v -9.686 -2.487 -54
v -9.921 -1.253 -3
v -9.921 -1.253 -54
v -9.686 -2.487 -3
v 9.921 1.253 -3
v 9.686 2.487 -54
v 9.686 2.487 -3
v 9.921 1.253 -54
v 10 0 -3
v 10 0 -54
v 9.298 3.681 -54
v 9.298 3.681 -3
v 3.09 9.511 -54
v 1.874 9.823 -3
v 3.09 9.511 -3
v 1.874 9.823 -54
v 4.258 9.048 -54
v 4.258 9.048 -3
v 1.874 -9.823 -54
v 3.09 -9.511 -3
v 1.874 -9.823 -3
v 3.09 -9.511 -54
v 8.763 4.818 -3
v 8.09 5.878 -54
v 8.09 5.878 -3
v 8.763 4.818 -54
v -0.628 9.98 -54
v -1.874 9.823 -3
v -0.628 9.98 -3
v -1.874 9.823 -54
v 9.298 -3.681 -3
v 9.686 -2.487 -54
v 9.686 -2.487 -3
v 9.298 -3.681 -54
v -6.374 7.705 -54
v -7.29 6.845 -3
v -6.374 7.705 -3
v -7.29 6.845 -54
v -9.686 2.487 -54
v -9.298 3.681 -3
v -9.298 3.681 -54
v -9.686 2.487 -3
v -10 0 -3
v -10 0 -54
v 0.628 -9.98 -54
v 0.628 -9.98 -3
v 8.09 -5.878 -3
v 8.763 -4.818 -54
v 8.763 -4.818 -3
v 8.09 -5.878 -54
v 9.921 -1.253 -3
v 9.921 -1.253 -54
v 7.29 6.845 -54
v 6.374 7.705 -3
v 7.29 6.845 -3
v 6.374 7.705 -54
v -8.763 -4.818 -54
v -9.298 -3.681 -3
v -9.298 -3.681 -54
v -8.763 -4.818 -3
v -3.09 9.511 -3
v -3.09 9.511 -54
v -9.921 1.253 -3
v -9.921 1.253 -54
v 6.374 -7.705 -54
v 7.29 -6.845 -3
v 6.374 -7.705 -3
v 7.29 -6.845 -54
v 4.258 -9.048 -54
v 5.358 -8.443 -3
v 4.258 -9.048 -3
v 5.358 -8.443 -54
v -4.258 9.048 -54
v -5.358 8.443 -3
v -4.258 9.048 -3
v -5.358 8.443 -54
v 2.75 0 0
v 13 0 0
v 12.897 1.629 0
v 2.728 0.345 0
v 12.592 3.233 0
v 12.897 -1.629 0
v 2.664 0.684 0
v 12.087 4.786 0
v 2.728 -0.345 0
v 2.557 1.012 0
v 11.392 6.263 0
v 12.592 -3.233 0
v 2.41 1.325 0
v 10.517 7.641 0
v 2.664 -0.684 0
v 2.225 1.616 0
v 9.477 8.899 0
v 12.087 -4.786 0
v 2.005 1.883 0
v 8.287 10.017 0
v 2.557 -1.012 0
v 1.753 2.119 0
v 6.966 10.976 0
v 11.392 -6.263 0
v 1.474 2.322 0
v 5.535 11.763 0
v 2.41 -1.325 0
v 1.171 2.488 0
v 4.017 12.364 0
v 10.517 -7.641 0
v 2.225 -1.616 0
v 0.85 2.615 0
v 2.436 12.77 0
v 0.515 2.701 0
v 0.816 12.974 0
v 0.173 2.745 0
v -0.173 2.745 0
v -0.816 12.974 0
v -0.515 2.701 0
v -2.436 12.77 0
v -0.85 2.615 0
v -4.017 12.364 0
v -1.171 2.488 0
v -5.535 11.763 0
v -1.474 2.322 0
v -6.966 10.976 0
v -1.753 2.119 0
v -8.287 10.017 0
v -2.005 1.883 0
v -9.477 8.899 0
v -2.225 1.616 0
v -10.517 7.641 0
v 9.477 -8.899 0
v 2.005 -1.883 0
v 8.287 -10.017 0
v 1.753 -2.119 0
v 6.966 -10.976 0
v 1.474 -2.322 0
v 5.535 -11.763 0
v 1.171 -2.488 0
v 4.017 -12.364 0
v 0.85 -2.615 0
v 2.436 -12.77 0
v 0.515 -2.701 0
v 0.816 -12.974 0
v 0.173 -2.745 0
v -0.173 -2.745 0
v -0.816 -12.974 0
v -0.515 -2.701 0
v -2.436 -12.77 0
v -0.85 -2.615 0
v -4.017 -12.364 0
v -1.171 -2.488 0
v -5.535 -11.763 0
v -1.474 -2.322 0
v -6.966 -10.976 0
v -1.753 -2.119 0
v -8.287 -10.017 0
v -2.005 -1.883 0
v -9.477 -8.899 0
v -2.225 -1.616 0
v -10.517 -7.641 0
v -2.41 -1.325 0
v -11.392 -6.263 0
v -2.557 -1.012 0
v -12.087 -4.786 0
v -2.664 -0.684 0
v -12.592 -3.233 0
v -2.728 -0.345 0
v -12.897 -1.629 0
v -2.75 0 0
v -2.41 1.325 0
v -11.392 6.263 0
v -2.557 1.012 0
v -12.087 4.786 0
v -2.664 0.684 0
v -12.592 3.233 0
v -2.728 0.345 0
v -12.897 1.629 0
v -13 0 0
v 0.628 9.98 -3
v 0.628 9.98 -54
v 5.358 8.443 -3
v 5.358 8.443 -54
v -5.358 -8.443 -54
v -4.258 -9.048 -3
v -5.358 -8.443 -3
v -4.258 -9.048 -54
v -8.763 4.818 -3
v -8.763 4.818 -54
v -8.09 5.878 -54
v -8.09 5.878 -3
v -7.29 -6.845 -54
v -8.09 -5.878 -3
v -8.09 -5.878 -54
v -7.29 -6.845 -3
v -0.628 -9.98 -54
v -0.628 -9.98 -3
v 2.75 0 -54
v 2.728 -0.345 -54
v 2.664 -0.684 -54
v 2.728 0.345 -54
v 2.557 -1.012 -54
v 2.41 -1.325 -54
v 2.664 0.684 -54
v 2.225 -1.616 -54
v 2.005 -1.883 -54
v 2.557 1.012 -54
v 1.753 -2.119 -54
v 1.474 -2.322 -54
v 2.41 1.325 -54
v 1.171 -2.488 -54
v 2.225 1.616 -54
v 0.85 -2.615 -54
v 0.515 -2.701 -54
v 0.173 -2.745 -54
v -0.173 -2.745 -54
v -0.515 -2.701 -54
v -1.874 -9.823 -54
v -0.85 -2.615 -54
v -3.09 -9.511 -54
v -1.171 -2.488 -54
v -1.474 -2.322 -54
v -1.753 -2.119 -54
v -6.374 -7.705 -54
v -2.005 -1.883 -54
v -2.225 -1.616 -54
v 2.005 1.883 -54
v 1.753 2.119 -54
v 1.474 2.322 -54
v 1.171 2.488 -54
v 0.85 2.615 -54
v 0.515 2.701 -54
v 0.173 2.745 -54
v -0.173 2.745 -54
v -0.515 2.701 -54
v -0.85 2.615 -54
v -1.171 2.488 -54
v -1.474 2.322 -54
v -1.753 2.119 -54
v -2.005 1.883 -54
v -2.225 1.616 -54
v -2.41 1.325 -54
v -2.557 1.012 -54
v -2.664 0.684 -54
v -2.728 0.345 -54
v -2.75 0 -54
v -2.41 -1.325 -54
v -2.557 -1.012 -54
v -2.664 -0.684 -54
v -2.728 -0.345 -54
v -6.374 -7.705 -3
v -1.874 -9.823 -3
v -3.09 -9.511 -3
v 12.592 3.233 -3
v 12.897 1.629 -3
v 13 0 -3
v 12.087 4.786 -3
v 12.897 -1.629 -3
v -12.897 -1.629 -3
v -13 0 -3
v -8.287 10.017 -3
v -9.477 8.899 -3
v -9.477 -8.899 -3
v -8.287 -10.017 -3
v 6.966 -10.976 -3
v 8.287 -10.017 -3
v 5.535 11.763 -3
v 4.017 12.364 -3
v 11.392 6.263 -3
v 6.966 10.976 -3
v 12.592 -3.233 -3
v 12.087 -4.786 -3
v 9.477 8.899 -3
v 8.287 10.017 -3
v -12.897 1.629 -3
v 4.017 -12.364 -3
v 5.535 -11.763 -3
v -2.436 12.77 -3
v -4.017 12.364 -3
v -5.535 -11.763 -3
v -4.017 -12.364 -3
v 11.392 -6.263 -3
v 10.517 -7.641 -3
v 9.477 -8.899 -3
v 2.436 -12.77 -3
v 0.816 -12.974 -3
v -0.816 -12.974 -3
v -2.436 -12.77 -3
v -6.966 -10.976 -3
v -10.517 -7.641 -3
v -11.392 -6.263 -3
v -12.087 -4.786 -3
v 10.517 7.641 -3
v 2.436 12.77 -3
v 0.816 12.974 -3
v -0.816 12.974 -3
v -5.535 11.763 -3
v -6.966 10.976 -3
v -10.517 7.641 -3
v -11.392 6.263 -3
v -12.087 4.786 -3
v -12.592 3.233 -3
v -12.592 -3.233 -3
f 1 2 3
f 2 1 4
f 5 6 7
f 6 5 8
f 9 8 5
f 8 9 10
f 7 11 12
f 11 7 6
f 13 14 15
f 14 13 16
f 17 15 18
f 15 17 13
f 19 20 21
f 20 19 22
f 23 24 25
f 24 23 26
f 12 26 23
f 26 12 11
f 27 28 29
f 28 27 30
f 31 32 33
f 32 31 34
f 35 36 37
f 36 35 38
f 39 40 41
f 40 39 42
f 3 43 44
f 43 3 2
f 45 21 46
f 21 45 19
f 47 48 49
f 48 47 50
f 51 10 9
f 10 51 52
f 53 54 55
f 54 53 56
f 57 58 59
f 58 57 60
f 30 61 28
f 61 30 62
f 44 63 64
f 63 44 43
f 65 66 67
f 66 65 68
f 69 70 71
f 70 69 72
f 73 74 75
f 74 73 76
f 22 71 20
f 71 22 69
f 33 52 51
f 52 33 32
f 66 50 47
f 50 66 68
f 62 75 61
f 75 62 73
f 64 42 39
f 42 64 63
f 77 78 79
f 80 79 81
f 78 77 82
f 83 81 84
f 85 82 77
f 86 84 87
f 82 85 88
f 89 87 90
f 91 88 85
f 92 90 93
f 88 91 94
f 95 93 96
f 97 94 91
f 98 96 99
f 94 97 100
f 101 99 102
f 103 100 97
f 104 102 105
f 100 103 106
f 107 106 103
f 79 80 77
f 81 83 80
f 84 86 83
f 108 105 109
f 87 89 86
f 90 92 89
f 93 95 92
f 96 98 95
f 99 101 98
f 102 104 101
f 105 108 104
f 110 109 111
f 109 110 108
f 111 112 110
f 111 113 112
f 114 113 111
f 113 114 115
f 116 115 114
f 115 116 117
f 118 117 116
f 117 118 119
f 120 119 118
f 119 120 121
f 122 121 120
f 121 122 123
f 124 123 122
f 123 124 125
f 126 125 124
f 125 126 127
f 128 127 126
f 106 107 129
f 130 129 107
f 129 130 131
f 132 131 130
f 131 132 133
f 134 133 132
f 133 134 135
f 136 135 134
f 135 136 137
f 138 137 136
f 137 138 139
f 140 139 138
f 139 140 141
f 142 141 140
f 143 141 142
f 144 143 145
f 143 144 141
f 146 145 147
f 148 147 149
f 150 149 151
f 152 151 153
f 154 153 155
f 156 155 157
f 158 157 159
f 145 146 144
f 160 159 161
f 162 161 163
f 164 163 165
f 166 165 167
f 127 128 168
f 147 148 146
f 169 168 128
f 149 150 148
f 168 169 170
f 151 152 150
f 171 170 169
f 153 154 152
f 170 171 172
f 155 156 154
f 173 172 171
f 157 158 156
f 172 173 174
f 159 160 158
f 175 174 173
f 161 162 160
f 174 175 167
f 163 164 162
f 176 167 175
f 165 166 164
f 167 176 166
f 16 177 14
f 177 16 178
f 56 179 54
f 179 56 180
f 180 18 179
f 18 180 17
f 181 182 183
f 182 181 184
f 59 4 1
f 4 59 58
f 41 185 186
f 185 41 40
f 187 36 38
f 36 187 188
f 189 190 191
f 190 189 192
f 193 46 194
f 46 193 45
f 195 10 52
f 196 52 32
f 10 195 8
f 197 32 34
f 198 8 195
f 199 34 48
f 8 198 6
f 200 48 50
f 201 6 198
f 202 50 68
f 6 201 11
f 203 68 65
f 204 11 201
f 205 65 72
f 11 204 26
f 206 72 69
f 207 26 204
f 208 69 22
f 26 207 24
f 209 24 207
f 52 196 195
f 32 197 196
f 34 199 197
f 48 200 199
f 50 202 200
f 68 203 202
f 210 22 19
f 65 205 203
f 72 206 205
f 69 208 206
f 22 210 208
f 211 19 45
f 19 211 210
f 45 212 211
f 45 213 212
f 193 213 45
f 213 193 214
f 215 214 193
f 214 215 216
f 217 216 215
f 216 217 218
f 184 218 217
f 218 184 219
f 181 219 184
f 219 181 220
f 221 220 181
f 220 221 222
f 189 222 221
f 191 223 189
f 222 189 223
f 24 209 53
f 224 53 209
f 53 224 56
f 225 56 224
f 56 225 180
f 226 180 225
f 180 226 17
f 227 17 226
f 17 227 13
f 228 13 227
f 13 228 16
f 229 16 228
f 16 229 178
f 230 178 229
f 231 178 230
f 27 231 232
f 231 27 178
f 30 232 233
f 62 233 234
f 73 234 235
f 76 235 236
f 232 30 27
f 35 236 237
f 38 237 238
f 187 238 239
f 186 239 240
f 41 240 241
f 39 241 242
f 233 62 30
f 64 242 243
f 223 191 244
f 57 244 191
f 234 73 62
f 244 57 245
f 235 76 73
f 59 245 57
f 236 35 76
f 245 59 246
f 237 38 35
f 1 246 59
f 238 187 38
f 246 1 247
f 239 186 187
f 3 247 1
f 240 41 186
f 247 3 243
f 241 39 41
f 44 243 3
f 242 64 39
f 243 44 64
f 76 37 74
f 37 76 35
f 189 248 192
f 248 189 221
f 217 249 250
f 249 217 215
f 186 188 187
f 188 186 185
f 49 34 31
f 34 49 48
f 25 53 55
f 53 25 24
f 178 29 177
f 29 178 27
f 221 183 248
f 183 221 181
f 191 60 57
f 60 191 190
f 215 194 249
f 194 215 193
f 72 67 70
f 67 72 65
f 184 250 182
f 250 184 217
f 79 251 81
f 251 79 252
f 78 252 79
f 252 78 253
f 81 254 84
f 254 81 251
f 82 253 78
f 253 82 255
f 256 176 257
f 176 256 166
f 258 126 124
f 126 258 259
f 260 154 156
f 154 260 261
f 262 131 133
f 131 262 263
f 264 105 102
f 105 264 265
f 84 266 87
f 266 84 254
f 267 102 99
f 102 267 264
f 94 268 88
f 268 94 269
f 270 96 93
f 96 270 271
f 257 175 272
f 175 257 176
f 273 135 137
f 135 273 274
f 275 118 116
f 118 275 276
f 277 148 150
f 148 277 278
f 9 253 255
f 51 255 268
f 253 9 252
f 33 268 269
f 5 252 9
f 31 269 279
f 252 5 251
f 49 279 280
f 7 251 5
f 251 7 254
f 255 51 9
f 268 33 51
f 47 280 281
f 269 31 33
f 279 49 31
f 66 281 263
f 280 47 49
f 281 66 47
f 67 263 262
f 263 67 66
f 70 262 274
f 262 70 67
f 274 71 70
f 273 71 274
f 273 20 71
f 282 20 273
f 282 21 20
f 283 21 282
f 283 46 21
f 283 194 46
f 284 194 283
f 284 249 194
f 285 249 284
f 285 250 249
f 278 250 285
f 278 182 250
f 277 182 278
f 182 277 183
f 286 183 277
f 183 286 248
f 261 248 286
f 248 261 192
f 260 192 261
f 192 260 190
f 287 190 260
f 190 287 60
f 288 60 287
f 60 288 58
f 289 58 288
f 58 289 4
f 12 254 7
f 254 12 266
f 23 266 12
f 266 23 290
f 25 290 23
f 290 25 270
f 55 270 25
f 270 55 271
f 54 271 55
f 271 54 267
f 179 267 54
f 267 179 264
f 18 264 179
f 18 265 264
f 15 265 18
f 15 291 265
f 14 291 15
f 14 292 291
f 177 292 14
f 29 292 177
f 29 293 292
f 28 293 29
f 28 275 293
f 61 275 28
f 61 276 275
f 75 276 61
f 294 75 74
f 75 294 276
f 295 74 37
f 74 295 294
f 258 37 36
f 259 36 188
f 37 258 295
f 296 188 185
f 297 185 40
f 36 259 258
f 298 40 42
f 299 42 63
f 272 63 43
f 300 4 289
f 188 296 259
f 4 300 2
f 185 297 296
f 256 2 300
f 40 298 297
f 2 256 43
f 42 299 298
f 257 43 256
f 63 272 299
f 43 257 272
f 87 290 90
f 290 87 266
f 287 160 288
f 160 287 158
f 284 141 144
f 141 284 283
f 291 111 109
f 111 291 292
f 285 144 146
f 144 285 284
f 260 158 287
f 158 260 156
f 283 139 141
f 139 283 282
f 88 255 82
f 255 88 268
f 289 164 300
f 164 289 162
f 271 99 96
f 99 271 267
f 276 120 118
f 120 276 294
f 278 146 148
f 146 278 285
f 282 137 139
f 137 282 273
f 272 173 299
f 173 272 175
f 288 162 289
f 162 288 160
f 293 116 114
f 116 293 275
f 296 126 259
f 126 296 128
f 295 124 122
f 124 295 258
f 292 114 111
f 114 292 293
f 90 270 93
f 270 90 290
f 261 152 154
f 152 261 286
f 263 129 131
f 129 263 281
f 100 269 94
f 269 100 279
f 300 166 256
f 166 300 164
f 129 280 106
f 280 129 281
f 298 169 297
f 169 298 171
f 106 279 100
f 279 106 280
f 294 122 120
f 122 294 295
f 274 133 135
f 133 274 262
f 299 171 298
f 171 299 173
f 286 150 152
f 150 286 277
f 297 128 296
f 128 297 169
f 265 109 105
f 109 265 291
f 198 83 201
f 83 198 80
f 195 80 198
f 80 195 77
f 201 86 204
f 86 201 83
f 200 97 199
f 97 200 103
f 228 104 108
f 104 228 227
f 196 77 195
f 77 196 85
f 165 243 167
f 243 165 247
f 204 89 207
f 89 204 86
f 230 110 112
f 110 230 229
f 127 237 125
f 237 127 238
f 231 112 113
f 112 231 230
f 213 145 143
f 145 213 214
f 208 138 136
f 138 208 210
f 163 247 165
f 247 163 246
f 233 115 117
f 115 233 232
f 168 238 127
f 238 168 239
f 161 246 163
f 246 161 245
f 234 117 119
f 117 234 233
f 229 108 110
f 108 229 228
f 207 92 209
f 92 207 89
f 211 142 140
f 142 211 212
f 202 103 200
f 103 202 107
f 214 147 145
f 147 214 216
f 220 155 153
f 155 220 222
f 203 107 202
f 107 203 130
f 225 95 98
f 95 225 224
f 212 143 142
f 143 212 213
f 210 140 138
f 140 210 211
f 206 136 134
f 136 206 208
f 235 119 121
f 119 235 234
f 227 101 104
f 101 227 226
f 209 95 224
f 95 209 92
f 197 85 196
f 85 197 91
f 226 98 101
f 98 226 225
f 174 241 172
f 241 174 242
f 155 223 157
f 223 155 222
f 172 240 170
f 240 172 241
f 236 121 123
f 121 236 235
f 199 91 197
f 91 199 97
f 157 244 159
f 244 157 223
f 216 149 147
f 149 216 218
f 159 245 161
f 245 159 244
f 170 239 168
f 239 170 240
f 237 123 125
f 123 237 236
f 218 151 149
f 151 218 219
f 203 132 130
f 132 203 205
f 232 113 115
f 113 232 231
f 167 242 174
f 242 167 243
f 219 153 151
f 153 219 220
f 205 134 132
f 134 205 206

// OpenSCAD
$fn = 50;


difference() {
	union() {
		translate(v = [0, 0, -54.0000000000]) {
			cylinder(h = 54, r = 10.0000000000);
		}
		translate(v = [0, 0, -3.0000000000]) {
			cylinder(h = 3, r = 13.0000000000);
		}
	}
	union() {
		#translate(v = [0, 0, -54]) {
			cylinder(h = 54, r = 2.7500000000);
		}
	}
}
